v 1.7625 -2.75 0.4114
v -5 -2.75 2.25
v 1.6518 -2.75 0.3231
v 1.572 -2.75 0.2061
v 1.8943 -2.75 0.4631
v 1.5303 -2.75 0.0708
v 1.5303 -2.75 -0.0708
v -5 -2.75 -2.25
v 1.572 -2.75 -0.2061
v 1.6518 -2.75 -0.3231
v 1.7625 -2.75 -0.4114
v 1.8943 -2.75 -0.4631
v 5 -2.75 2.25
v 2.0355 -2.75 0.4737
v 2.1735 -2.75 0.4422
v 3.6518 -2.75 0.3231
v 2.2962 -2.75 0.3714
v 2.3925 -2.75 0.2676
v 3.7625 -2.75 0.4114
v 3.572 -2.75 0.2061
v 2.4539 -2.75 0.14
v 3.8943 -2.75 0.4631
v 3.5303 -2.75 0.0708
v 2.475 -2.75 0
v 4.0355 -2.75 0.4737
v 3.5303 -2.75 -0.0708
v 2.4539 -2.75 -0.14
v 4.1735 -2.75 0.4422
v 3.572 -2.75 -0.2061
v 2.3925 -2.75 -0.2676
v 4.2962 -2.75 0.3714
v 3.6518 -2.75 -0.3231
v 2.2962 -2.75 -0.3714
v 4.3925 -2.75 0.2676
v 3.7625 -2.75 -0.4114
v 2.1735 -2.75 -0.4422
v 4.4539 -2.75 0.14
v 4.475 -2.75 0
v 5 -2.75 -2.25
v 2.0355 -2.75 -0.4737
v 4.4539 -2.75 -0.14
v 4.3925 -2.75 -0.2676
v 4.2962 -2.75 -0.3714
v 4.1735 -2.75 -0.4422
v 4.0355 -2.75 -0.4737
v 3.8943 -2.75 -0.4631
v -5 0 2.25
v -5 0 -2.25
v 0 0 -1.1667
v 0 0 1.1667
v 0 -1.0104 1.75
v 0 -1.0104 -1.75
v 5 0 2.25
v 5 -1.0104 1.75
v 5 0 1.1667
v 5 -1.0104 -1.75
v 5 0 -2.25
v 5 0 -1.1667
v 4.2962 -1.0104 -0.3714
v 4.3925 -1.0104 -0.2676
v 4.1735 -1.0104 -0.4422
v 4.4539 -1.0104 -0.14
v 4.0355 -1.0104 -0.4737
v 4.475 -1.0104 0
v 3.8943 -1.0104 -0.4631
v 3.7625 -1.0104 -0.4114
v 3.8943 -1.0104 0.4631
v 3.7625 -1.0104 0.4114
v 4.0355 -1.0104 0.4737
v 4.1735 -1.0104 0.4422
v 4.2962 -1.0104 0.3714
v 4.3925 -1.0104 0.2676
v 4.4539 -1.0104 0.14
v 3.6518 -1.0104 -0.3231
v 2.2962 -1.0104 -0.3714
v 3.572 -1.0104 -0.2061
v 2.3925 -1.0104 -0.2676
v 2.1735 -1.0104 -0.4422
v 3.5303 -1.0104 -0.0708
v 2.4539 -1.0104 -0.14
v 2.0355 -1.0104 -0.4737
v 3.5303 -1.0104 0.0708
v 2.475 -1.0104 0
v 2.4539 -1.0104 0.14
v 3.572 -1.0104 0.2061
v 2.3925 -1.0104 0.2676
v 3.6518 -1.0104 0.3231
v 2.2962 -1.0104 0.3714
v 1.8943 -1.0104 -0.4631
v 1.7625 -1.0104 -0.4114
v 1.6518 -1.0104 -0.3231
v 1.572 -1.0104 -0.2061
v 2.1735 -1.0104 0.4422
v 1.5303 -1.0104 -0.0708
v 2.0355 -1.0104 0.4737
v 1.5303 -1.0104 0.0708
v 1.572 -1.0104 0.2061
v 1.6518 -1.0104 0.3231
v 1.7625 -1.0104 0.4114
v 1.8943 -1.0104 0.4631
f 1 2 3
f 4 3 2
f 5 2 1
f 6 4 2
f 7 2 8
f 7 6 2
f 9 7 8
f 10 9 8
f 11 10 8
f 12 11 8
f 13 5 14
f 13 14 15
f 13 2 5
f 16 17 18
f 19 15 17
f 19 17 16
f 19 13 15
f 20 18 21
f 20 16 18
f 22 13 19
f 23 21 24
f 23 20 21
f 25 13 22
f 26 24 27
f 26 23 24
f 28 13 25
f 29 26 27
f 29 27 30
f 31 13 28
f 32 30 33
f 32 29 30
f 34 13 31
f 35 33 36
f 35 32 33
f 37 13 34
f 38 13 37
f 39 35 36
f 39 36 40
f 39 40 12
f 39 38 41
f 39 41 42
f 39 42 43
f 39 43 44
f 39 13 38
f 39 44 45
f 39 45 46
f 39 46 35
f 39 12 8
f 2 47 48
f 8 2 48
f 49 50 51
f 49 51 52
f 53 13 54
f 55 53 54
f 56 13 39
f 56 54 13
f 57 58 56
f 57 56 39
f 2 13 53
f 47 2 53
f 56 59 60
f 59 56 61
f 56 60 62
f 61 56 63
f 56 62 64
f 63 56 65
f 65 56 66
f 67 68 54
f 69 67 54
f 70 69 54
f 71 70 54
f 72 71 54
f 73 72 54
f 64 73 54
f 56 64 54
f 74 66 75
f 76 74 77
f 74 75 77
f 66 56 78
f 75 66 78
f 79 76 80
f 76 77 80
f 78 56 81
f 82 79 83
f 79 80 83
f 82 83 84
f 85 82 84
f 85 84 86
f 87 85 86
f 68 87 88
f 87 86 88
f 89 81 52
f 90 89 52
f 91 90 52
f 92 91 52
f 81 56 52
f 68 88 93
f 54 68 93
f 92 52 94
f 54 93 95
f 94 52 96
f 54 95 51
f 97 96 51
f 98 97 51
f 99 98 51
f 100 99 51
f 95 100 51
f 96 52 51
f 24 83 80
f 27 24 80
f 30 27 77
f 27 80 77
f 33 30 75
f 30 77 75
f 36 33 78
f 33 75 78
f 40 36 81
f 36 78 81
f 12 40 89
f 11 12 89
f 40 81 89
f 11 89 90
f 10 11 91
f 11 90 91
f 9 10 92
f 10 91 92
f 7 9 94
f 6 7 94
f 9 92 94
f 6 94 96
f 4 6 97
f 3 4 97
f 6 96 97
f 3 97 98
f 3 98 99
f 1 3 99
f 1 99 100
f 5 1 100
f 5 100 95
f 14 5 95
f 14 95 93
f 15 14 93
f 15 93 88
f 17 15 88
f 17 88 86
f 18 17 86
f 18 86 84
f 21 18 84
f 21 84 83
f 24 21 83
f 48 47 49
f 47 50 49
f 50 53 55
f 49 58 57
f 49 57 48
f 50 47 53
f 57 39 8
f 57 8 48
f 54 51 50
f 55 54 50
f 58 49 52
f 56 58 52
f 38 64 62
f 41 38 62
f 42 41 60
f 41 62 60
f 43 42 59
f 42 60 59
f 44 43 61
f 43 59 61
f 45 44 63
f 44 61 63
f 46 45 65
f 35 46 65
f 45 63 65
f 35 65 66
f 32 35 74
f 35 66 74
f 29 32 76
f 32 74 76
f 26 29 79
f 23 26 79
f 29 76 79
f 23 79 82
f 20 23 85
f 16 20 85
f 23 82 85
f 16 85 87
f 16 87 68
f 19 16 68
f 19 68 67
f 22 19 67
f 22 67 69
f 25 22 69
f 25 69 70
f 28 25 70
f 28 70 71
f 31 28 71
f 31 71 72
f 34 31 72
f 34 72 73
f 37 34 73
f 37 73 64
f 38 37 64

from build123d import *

# Parameters (mm, degrees)
BOSS_EXTRUDE1_DEPTH                = 5
BASE_SKETCH_4_W                    = 4.5
BASE_SKETCH_4_H                    = 2.75
BOSS_EXTRUDE2_DEPTH                = 5
TAP_DRILL_FOR_M1_2X0_25_TAP1_D     = 0.95
TAP_DRILL_FOR_M1_2X0_25_TAP1_DEPTH = 1.739637029


with BuildPart() as part:
    # base_sketch<3> → Boss-Extrude1 (new body)
    with BuildSketch(Plane(origin=(0, 0, 0), x_dir=(0, 0, -1), z_dir=(1, 0, 0))):
        Polygon((-1.75, -1.010362971), (-1.166666667, 0), (-2.25, 0), (-2.25, -2.75), (2.25, -2.75), (2.25, 0), (1.166666667, 0), (1.75, -1.010362971), align=None)
    extrude(amount=BOSS_EXTRUDE1_DEPTH)

    # base_sketch<4> → Boss-Extrude2 (add)
    with BuildSketch(Plane(origin=(0, 0, 0), x_dir=(0, 0, -1), z_dir=(1, 0, 0))):
        with Locations((0, -1.375)):
            Rectangle(BASE_SKETCH_4_W, BASE_SKETCH_4_H)
    extrude(amount=-BOSS_EXTRUDE2_DEPTH)

    # Tap Drill for M1.2x0.25 Tap1
    with Locations(Plane(origin=(0, -2.75, 0), x_dir=(-1, 0, 0), z_dir=(0, -1, 0))):
        with Locations((-4, 0), (-2, 0)):
            Hole(TAP_DRILL_FOR_M1_2X0_25_TAP1_D / 2, depth=TAP_DRILL_FOR_M1_2X0_25_TAP1_DEPTH)


solid = part.part
